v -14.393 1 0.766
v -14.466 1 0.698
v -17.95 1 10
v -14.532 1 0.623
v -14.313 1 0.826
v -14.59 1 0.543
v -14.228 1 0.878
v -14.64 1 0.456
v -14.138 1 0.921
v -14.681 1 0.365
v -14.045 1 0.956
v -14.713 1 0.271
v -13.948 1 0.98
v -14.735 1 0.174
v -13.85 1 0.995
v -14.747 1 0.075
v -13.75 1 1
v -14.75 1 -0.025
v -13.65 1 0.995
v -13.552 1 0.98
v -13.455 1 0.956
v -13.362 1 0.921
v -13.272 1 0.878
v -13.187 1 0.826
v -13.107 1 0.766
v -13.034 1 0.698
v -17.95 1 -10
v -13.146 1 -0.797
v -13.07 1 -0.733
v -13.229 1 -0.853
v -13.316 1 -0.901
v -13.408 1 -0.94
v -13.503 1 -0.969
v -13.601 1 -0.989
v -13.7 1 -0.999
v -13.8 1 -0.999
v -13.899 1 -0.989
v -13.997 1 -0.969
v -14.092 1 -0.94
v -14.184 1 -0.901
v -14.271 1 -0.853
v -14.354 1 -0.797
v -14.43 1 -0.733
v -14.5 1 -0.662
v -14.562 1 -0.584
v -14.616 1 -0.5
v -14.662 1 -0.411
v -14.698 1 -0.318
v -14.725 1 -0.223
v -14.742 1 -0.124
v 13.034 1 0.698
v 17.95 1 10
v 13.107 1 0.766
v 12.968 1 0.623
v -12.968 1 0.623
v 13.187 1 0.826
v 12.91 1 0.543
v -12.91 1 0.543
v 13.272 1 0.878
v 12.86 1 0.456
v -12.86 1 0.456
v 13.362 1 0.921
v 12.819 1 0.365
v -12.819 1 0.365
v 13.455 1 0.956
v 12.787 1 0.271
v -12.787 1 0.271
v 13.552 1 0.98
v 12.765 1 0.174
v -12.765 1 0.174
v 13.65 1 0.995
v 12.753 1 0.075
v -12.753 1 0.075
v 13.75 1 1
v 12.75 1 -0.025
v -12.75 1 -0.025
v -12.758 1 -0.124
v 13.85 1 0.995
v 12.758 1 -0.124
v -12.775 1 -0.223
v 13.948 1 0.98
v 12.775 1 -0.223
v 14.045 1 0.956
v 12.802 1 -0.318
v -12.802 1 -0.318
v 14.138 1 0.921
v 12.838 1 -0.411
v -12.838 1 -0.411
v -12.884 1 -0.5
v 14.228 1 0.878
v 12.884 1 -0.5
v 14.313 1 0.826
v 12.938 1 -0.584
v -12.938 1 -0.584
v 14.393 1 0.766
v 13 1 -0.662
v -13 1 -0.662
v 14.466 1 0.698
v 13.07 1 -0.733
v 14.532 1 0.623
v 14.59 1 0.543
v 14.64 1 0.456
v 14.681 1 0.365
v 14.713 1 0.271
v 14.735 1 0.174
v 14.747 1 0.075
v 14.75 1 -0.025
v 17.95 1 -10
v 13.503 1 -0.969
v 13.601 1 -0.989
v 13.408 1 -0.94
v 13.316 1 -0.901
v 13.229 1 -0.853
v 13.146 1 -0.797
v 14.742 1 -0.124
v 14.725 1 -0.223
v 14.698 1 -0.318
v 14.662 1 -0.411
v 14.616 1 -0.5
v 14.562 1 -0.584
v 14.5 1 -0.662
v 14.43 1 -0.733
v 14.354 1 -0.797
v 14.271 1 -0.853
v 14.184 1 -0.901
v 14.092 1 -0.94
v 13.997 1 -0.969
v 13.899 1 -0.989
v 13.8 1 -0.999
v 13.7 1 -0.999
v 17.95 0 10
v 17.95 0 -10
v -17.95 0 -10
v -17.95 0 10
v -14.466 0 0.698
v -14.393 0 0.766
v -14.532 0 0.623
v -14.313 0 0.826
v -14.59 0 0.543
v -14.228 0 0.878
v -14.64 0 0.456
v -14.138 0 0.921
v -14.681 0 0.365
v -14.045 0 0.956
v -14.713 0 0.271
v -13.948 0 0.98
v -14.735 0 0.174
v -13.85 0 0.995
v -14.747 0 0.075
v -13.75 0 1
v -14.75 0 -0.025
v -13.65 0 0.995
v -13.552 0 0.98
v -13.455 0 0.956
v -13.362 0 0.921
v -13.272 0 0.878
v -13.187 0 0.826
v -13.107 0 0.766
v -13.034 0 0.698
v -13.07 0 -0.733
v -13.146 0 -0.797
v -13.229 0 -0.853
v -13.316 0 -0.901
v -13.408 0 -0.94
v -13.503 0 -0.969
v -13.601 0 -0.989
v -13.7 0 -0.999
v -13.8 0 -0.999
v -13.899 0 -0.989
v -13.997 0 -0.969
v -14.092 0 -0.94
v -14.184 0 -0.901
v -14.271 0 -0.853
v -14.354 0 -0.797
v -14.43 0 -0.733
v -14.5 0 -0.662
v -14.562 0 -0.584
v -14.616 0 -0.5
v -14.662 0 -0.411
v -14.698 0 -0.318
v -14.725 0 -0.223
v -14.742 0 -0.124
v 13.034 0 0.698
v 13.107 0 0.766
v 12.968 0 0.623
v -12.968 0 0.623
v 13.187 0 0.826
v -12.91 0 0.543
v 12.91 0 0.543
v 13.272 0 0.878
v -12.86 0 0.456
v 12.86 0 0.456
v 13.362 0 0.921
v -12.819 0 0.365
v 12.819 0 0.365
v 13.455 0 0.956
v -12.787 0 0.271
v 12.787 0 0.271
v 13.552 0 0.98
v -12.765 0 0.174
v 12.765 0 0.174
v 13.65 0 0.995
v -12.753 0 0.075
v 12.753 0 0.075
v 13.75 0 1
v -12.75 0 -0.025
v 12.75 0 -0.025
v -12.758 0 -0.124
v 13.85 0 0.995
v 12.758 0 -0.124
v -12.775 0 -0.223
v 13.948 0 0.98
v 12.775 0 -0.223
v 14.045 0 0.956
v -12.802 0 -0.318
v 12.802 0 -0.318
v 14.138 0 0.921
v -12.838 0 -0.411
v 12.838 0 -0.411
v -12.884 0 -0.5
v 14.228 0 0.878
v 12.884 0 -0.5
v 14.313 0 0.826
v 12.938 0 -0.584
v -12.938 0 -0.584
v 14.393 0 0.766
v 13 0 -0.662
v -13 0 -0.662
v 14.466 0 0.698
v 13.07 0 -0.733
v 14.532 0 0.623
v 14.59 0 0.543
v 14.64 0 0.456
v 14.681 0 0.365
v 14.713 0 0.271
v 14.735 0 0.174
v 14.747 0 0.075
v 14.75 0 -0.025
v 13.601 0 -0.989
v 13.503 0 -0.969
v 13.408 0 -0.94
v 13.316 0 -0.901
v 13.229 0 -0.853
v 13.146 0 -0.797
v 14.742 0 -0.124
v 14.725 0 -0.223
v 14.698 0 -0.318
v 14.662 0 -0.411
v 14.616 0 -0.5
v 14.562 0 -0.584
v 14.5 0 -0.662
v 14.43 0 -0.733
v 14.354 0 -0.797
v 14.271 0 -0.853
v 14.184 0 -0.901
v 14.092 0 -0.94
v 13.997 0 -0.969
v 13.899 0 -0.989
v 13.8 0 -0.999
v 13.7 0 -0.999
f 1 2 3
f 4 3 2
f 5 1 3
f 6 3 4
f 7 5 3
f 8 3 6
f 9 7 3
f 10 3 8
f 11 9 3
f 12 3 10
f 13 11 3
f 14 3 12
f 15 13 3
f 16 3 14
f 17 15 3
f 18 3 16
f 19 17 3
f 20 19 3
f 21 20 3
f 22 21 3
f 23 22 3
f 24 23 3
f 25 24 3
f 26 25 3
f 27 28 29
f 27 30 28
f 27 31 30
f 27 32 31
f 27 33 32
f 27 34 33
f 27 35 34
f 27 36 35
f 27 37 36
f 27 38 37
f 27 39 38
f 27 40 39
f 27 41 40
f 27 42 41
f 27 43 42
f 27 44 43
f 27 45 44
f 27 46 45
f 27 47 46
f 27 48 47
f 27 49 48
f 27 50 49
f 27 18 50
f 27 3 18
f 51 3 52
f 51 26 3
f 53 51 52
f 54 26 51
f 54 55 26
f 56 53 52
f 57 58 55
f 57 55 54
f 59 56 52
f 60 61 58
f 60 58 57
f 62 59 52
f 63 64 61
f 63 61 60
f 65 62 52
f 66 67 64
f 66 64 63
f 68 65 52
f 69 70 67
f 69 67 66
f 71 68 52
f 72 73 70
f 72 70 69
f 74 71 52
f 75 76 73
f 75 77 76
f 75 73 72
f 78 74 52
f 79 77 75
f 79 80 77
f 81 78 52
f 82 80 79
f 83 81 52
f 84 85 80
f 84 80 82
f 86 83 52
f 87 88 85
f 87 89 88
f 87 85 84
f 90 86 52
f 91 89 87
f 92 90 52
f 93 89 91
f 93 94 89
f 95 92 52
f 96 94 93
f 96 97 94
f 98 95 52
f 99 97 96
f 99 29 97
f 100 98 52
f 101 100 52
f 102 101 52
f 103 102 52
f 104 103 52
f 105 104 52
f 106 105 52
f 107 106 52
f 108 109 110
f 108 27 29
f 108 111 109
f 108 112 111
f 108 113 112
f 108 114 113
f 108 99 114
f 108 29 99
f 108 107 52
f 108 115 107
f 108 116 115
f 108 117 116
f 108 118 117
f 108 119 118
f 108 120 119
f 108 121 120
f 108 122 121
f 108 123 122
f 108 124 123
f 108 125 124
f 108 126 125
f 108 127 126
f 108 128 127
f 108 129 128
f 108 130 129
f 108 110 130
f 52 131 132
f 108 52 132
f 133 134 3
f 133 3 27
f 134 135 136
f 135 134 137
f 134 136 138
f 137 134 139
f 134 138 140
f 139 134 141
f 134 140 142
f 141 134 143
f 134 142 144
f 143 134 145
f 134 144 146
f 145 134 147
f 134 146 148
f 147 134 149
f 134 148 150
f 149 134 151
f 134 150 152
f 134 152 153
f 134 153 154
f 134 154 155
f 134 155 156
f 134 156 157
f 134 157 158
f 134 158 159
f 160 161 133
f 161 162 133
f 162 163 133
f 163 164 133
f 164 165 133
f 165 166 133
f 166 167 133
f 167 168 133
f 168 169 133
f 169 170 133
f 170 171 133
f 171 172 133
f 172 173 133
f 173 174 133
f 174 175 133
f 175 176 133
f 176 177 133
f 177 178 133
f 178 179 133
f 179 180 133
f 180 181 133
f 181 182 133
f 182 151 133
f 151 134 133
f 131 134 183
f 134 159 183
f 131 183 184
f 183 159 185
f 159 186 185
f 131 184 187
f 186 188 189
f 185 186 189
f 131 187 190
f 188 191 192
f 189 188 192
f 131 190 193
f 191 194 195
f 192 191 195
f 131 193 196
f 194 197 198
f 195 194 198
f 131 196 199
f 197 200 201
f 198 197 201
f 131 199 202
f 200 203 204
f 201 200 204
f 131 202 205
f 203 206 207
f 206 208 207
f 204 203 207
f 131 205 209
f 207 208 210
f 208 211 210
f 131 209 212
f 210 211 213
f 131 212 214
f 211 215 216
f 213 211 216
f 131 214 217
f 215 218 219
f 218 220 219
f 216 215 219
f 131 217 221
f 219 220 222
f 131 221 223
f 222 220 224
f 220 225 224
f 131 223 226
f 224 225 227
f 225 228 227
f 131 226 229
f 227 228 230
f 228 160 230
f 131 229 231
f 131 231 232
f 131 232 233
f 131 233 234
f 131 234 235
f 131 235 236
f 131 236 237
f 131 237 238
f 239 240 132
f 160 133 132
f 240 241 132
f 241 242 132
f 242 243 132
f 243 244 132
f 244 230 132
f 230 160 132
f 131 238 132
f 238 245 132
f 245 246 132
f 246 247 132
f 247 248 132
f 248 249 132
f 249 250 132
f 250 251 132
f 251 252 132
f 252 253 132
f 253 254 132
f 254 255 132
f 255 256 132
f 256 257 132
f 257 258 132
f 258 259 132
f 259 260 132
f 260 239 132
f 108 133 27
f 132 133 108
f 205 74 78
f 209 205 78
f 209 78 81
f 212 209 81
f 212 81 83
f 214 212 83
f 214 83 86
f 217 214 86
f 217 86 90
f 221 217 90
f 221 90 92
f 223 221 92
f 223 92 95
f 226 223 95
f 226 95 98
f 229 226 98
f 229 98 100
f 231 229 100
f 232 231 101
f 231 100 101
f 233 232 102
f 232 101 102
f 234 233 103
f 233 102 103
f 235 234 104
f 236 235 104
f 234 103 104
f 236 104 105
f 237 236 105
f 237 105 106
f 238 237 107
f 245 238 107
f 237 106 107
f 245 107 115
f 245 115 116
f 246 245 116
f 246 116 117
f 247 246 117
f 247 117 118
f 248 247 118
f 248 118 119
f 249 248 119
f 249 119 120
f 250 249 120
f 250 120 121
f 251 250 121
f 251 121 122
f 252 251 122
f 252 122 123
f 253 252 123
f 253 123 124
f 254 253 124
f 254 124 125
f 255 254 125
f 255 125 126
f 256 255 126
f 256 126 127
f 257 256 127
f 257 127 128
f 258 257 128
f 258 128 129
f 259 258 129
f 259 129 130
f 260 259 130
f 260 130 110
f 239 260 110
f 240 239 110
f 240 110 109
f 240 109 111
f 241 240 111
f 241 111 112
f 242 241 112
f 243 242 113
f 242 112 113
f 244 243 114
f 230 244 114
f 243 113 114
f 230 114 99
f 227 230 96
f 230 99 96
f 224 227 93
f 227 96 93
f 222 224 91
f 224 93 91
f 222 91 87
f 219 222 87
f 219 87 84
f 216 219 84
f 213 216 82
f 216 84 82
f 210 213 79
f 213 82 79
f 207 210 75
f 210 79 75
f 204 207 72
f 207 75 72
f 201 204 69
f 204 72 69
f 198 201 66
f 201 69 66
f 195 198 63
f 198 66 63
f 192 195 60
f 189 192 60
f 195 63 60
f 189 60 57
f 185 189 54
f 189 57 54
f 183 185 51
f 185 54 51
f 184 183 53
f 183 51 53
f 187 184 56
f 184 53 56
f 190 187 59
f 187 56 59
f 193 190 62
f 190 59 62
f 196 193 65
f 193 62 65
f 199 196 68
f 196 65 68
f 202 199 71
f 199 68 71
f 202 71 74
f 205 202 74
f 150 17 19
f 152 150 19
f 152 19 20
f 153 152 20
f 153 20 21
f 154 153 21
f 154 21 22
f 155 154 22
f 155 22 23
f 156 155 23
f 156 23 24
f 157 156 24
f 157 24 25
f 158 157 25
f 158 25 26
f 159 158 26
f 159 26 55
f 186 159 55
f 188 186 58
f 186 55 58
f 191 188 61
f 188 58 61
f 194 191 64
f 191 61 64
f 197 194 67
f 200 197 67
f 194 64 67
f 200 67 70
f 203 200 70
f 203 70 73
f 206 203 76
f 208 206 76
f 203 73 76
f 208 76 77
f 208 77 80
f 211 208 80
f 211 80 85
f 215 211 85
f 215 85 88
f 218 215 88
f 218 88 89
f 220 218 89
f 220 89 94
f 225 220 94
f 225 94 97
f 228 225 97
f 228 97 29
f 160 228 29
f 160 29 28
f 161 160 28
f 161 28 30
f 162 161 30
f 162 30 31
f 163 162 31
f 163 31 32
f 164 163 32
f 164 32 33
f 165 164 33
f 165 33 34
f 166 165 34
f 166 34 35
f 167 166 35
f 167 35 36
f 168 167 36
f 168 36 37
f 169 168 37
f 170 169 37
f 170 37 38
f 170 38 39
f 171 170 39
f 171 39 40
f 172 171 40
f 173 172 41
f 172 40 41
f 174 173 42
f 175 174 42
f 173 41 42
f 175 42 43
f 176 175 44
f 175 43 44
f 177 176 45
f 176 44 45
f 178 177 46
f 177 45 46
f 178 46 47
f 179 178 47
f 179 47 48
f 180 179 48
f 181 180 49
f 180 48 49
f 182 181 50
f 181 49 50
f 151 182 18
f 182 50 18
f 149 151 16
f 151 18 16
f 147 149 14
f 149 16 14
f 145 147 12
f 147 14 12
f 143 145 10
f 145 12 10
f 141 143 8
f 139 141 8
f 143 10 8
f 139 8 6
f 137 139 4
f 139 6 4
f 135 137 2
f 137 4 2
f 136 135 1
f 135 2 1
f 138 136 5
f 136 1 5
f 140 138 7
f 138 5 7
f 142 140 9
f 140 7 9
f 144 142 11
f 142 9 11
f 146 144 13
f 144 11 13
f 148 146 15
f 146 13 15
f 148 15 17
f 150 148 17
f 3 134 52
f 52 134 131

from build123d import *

# Parameters (mm, degrees)
ESBO_O1_W                = 35.9
ESBO_O1_H                = 20
RESSALTO_EXTRUS_O1_DEPTH = 1
CORTE_EXTRUS_O1_REACH    = 22.572
ESBO_O2_R                = 1


with BuildPart() as part:
    # Esboço1 → Ressalto-extrusão1 (new body)
    with BuildSketch(Plane(origin=(0, 0, 0), x_dir=(1, 0, 0), z_dir=(0, 1, 0))):
        Rectangle(ESBO_O1_W, ESBO_O1_H)
    extrude(amount=RESSALTO_EXTRUS_O1_DEPTH)

    # Esboço2 → Corte-extrusão1 (cut, up to next)
    with BuildSketch(Plane(origin=(0, 1, 0), x_dir=(1, 0, 0), z_dir=(0, 1, 0)), mode=Mode.PRIVATE) as corte_extrus_o1_sk1:
        with Locations(Location((13.75, 0, 0), (0, 0, 270))):
            Circle(ESBO_O2_R)
    corte_extrus_o1_tool1 = extrude(corte_extrus_o1_sk1.sketch, amount=-CORTE_EXTRUS_O1_REACH, mode=Mode.PRIVATE) & part.part
    # Esboço2 → Corte-extrusão1 (cut, up to next)
    with BuildSketch(Plane(origin=(0, 1, 0), x_dir=(1, 0, 0), z_dir=(0, 1, 0)), mode=Mode.PRIVATE) as corte_extrus_o1_sk2:
        with Locations(Location((-13.75, 0, 0), (0, 0, 270))):
            Circle(ESBO_O2_R)
    corte_extrus_o1_tool2 = extrude(corte_extrus_o1_sk2.sketch, amount=-CORTE_EXTRUS_O1_REACH, mode=Mode.PRIVATE) & part.part
    add(corte_extrus_o1_tool1.solids().sort_by_distance((13.75, 1, 0))[0], mode=Mode.SUBTRACT)
    add(corte_extrus_o1_tool2.solids().sort_by_distance((-13.75, 1, 0))[0], mode=Mode.SUBTRACT)


solid = part.part
